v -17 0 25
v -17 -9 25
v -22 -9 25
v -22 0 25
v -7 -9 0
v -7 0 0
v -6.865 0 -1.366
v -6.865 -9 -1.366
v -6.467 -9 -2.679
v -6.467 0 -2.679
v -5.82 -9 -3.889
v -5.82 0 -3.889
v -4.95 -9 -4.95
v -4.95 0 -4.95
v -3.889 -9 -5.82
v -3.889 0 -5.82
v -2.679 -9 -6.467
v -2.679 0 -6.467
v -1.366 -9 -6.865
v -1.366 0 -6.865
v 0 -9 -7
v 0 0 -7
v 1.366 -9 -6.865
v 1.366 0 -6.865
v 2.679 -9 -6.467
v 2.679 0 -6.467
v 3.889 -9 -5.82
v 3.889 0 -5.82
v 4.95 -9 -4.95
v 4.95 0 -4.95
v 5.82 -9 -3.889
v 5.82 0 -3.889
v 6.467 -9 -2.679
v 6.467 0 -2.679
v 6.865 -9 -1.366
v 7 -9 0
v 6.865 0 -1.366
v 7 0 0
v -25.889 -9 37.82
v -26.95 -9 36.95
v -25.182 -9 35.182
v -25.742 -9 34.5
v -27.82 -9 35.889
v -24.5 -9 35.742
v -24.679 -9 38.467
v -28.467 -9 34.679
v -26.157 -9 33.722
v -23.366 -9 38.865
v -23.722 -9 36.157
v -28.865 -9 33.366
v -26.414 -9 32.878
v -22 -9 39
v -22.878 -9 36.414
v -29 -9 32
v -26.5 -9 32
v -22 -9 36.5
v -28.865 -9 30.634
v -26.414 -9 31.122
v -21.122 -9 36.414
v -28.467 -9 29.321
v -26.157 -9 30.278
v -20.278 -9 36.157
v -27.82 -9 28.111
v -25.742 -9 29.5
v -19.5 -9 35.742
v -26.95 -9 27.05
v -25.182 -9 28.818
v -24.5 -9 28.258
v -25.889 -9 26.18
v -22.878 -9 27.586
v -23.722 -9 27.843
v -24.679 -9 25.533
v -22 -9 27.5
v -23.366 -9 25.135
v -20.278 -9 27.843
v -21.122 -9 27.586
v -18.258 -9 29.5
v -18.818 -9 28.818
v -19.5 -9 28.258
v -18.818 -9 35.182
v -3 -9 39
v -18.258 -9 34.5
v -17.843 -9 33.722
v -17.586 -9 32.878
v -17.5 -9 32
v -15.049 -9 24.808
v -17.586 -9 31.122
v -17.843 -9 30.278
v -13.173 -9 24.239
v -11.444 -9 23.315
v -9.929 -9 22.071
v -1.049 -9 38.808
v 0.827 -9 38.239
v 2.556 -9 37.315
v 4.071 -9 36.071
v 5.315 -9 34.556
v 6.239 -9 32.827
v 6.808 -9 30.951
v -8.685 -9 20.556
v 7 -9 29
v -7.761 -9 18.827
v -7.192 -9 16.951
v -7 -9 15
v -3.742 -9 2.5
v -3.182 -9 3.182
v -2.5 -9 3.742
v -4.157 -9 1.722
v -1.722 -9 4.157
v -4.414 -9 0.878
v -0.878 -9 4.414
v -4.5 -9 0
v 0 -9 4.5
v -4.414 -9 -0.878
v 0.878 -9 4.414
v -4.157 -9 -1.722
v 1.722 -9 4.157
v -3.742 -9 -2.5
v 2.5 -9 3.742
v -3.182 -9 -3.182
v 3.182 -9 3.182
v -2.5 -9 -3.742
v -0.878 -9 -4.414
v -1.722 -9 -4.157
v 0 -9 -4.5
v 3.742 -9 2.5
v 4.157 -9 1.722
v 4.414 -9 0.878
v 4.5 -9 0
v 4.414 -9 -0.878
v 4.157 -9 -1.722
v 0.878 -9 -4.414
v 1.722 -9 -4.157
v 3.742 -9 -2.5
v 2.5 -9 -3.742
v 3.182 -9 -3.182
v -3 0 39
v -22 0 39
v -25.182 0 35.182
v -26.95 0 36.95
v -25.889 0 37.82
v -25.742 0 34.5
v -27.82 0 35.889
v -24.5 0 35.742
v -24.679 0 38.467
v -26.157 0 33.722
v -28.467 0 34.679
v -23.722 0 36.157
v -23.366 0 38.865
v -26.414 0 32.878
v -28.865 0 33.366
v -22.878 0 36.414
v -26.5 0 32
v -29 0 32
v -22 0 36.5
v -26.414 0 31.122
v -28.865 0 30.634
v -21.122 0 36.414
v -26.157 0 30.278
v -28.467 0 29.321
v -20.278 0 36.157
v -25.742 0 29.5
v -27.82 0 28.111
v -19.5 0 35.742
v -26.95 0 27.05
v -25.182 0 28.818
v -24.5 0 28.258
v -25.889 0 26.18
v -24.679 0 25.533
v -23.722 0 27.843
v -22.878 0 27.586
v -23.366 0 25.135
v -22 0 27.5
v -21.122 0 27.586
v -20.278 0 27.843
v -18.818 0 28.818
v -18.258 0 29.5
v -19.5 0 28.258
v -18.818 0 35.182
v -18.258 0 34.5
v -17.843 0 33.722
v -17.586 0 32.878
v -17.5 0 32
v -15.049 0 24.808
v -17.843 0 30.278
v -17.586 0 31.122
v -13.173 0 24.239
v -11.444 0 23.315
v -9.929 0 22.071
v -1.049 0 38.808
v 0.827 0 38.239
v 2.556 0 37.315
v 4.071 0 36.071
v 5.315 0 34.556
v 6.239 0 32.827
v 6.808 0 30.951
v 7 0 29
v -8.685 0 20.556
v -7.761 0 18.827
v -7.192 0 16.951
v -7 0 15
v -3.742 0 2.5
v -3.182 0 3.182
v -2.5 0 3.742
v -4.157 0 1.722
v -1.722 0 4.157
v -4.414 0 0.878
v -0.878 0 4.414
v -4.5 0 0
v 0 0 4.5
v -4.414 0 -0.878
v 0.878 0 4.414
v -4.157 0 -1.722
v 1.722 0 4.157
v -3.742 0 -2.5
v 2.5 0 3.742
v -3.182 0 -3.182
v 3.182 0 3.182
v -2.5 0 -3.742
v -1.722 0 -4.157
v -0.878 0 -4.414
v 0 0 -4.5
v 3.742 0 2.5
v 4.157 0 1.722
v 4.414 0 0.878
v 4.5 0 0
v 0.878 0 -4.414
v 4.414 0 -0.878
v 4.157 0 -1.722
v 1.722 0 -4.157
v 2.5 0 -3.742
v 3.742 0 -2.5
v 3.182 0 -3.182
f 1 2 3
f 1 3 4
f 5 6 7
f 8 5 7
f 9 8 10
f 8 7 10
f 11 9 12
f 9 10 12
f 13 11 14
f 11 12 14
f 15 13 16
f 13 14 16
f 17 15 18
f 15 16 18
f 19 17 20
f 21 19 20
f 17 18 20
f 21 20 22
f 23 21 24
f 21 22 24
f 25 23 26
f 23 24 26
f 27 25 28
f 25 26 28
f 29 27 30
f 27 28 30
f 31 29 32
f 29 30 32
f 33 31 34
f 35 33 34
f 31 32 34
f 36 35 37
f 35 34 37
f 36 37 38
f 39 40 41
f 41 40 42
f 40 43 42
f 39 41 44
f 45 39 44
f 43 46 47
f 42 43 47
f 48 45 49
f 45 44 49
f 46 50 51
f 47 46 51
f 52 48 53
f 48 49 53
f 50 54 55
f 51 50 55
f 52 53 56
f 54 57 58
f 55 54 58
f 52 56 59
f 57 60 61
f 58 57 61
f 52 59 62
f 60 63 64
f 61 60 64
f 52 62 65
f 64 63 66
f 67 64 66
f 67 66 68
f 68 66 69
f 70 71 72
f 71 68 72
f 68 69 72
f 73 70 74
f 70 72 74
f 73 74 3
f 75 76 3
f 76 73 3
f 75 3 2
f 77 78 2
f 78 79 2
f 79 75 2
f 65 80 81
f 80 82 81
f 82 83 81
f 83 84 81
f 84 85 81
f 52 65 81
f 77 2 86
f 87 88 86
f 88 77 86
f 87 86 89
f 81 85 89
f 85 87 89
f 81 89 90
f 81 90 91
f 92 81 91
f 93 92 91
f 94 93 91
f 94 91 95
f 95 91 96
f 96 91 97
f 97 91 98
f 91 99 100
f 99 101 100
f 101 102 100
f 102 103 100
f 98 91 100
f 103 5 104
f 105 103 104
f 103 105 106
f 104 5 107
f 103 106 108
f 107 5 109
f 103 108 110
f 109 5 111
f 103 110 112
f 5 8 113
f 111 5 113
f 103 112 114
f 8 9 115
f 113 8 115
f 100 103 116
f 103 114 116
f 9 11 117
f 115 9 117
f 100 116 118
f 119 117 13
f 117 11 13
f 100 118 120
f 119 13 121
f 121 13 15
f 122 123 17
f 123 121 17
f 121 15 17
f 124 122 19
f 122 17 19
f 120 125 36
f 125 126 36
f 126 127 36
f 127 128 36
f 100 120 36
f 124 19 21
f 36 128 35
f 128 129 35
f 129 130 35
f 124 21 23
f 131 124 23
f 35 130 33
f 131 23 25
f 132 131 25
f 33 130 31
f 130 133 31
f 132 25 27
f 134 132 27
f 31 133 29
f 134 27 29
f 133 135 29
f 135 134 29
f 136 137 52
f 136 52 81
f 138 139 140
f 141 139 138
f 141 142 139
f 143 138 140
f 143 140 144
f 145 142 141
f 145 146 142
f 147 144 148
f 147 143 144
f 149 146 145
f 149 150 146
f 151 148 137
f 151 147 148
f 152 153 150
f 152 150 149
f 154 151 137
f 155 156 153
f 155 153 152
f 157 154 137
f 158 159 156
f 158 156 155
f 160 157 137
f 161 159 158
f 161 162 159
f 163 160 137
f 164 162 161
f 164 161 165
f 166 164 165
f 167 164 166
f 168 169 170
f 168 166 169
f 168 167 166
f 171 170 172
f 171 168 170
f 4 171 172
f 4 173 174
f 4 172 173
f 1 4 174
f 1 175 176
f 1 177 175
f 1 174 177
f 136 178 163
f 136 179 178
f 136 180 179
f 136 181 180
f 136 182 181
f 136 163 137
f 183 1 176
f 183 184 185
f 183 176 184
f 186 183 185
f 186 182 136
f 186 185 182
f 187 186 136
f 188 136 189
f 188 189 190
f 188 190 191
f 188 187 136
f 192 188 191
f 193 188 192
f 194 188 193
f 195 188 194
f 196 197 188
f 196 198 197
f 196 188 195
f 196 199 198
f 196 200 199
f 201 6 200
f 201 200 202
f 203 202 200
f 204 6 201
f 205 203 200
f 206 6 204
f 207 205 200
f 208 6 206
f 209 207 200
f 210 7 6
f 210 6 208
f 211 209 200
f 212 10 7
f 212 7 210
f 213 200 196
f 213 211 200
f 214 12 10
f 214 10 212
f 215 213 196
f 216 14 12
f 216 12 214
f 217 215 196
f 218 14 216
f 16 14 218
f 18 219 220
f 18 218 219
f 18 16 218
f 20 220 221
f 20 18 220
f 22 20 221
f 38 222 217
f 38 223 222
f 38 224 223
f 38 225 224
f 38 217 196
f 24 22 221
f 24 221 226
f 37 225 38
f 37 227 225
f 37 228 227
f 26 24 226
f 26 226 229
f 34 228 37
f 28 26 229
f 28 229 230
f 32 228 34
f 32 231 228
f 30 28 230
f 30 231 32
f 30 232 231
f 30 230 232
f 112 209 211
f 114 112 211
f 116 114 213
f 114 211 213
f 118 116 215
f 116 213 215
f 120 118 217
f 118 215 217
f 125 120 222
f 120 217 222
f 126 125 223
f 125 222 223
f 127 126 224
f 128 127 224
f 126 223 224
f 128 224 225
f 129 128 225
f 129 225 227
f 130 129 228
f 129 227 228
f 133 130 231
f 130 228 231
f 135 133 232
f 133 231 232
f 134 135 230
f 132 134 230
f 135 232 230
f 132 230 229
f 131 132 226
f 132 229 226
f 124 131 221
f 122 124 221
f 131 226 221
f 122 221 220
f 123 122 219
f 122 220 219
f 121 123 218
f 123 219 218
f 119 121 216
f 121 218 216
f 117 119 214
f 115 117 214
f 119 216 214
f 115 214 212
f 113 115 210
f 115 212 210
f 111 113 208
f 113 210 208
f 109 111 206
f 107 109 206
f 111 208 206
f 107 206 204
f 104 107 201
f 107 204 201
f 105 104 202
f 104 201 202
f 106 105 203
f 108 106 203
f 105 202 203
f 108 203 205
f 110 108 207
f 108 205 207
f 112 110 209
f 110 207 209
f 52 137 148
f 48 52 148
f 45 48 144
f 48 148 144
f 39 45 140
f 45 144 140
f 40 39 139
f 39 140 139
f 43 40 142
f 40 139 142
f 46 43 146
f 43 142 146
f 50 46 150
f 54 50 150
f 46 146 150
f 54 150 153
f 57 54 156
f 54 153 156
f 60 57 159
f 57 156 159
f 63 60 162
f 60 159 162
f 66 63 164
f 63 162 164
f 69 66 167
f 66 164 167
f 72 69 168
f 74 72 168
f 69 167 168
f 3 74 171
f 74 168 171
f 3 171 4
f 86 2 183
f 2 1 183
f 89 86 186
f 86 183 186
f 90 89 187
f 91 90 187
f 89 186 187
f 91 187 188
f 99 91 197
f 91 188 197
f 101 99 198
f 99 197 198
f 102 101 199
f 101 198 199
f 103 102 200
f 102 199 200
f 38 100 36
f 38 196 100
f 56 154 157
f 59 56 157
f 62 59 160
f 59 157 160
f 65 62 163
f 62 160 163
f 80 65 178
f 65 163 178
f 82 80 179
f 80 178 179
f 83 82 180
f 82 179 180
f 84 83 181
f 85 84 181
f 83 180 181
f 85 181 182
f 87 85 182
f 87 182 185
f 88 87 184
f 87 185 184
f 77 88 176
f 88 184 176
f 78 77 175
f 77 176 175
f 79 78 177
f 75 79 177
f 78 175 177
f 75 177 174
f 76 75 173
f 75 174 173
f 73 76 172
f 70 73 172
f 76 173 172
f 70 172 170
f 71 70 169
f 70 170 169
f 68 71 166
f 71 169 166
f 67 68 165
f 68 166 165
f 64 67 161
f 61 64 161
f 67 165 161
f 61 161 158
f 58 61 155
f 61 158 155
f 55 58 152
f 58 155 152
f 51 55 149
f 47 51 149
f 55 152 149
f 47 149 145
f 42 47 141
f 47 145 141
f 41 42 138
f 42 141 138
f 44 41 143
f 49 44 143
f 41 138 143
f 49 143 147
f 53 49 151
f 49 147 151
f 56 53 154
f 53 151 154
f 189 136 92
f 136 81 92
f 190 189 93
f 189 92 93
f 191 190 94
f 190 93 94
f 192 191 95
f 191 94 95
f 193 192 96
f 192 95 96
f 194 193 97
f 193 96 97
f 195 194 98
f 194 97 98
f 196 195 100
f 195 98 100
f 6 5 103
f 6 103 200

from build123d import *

# Parameters (mm, degrees)
EXTRUDE_1_DEPTH     = 25
EXTRUDE_2_DEPTH     = 9
SKETCH_3_R          = 4.5
CUT_EXTRUDE_1_DEPTH = 9
SKETCH_5_W          = 14
SKETCH_5_H          = 9
EXTRUDE_3_DEPTH     = 15
EXTRUDE_4_DEPTH     = 9
SKETCH_7_R          = 4.5
CUT_EXTRUDE_2_DEPTH = 9
SKETCH_8_W          = 14
SKETCH_8_H          = 14
EXTRUDE_5_DEPTH     = 9
FILLET_1_R          = 10


with BuildPart() as part:
    # 草图1 → 凸台-拉伸1 (new body)
    with BuildSketch(Plane.XY):
        Polygon((0, 0), (7, 0), (7, -9), (-7, -9), (-7, 0), align=None)
    extrude(amount=EXTRUDE_1_DEPTH)

    # 草图2 → 凸台-拉伸2 (add)
    with BuildSketch(Plane(origin=(0, 0, 0), x_dir=(1, 0, 0), z_dir=(0, 1, 0))):
        with BuildLine():
            Line((7, 0), (-7, 0))
            ThreePointArc((-7, 0), (0, 7), (7, 0))
        make_face()
    extrude(amount=-EXTRUDE_2_DEPTH)

    # 草图3 → 切除-拉伸1 (cut)
    with BuildSketch(Plane(origin=(0, 0, 0), x_dir=(1, 0, 0), z_dir=(0, 1, 0))):
        with Locations(Location((0, 0, 0), (0, 0, 270))):
            Circle(SKETCH_3_R)
    extrude(amount=-CUT_EXTRUDE_1_DEPTH, mode=Mode.SUBTRACT)



with BuildPart() as body_2:
    # 草图5 → 凸台-拉伸3 (new body)
    with BuildSketch(Plane.ZY.offset(7)):
        with Locations((32, -4.5)):
            Rectangle(SKETCH_5_W, SKETCH_5_H)
    extrude(amount=EXTRUDE_3_DEPTH)

    # 草图6 → 凸台-拉伸4 (add)
    with BuildSketch(Plane(origin=(0, 0, 0), x_dir=(1, 0, 0), z_dir=(0, 1, 0))):
        with BuildLine():
            Line((-22, -25), (-22, -39))
            ThreePointArc((-22, -39), (-29, -32), (-22, -25))
        make_face()
    extrude(amount=-EXTRUDE_4_DEPTH)

    # 草图7 → 切除-拉伸2 (cut)
    with BuildSketch(Plane(origin=(0, 0, 0), x_dir=(1, 0, 0), z_dir=(0, 1, 0))):
        with Locations(Location((-22, -32, 0), (0, 0, 270))):
            Circle(SKETCH_7_R)
    extrude(amount=-CUT_EXTRUDE_2_DEPTH, mode=Mode.SUBTRACT)


with BuildPart() as part_1:
    add(part.part)

    add(body_2.part)  # 凸台-拉伸5 merges body 2
    # 草图8 → 凸台-拉伸5 (add)
    with BuildSketch(Plane(origin=(0, 0, 0), x_dir=(1, 0, 0), z_dir=(0, 1, 0))):
        with Locations((0, -32)):
            Rectangle(SKETCH_8_W, SKETCH_8_H)
    extrude(amount=-EXTRUDE_5_DEPTH)

    # 圆角1
    fillet_1_edges = [part_1.edges().sort_by_distance(p)[0] for p in [
        (7, -4.5, 39),
        (-7, -4.5, 25),
    ]]
    fillet(fillet_1_edges, radius=FILLET_1_R)


solid = part_1.part
